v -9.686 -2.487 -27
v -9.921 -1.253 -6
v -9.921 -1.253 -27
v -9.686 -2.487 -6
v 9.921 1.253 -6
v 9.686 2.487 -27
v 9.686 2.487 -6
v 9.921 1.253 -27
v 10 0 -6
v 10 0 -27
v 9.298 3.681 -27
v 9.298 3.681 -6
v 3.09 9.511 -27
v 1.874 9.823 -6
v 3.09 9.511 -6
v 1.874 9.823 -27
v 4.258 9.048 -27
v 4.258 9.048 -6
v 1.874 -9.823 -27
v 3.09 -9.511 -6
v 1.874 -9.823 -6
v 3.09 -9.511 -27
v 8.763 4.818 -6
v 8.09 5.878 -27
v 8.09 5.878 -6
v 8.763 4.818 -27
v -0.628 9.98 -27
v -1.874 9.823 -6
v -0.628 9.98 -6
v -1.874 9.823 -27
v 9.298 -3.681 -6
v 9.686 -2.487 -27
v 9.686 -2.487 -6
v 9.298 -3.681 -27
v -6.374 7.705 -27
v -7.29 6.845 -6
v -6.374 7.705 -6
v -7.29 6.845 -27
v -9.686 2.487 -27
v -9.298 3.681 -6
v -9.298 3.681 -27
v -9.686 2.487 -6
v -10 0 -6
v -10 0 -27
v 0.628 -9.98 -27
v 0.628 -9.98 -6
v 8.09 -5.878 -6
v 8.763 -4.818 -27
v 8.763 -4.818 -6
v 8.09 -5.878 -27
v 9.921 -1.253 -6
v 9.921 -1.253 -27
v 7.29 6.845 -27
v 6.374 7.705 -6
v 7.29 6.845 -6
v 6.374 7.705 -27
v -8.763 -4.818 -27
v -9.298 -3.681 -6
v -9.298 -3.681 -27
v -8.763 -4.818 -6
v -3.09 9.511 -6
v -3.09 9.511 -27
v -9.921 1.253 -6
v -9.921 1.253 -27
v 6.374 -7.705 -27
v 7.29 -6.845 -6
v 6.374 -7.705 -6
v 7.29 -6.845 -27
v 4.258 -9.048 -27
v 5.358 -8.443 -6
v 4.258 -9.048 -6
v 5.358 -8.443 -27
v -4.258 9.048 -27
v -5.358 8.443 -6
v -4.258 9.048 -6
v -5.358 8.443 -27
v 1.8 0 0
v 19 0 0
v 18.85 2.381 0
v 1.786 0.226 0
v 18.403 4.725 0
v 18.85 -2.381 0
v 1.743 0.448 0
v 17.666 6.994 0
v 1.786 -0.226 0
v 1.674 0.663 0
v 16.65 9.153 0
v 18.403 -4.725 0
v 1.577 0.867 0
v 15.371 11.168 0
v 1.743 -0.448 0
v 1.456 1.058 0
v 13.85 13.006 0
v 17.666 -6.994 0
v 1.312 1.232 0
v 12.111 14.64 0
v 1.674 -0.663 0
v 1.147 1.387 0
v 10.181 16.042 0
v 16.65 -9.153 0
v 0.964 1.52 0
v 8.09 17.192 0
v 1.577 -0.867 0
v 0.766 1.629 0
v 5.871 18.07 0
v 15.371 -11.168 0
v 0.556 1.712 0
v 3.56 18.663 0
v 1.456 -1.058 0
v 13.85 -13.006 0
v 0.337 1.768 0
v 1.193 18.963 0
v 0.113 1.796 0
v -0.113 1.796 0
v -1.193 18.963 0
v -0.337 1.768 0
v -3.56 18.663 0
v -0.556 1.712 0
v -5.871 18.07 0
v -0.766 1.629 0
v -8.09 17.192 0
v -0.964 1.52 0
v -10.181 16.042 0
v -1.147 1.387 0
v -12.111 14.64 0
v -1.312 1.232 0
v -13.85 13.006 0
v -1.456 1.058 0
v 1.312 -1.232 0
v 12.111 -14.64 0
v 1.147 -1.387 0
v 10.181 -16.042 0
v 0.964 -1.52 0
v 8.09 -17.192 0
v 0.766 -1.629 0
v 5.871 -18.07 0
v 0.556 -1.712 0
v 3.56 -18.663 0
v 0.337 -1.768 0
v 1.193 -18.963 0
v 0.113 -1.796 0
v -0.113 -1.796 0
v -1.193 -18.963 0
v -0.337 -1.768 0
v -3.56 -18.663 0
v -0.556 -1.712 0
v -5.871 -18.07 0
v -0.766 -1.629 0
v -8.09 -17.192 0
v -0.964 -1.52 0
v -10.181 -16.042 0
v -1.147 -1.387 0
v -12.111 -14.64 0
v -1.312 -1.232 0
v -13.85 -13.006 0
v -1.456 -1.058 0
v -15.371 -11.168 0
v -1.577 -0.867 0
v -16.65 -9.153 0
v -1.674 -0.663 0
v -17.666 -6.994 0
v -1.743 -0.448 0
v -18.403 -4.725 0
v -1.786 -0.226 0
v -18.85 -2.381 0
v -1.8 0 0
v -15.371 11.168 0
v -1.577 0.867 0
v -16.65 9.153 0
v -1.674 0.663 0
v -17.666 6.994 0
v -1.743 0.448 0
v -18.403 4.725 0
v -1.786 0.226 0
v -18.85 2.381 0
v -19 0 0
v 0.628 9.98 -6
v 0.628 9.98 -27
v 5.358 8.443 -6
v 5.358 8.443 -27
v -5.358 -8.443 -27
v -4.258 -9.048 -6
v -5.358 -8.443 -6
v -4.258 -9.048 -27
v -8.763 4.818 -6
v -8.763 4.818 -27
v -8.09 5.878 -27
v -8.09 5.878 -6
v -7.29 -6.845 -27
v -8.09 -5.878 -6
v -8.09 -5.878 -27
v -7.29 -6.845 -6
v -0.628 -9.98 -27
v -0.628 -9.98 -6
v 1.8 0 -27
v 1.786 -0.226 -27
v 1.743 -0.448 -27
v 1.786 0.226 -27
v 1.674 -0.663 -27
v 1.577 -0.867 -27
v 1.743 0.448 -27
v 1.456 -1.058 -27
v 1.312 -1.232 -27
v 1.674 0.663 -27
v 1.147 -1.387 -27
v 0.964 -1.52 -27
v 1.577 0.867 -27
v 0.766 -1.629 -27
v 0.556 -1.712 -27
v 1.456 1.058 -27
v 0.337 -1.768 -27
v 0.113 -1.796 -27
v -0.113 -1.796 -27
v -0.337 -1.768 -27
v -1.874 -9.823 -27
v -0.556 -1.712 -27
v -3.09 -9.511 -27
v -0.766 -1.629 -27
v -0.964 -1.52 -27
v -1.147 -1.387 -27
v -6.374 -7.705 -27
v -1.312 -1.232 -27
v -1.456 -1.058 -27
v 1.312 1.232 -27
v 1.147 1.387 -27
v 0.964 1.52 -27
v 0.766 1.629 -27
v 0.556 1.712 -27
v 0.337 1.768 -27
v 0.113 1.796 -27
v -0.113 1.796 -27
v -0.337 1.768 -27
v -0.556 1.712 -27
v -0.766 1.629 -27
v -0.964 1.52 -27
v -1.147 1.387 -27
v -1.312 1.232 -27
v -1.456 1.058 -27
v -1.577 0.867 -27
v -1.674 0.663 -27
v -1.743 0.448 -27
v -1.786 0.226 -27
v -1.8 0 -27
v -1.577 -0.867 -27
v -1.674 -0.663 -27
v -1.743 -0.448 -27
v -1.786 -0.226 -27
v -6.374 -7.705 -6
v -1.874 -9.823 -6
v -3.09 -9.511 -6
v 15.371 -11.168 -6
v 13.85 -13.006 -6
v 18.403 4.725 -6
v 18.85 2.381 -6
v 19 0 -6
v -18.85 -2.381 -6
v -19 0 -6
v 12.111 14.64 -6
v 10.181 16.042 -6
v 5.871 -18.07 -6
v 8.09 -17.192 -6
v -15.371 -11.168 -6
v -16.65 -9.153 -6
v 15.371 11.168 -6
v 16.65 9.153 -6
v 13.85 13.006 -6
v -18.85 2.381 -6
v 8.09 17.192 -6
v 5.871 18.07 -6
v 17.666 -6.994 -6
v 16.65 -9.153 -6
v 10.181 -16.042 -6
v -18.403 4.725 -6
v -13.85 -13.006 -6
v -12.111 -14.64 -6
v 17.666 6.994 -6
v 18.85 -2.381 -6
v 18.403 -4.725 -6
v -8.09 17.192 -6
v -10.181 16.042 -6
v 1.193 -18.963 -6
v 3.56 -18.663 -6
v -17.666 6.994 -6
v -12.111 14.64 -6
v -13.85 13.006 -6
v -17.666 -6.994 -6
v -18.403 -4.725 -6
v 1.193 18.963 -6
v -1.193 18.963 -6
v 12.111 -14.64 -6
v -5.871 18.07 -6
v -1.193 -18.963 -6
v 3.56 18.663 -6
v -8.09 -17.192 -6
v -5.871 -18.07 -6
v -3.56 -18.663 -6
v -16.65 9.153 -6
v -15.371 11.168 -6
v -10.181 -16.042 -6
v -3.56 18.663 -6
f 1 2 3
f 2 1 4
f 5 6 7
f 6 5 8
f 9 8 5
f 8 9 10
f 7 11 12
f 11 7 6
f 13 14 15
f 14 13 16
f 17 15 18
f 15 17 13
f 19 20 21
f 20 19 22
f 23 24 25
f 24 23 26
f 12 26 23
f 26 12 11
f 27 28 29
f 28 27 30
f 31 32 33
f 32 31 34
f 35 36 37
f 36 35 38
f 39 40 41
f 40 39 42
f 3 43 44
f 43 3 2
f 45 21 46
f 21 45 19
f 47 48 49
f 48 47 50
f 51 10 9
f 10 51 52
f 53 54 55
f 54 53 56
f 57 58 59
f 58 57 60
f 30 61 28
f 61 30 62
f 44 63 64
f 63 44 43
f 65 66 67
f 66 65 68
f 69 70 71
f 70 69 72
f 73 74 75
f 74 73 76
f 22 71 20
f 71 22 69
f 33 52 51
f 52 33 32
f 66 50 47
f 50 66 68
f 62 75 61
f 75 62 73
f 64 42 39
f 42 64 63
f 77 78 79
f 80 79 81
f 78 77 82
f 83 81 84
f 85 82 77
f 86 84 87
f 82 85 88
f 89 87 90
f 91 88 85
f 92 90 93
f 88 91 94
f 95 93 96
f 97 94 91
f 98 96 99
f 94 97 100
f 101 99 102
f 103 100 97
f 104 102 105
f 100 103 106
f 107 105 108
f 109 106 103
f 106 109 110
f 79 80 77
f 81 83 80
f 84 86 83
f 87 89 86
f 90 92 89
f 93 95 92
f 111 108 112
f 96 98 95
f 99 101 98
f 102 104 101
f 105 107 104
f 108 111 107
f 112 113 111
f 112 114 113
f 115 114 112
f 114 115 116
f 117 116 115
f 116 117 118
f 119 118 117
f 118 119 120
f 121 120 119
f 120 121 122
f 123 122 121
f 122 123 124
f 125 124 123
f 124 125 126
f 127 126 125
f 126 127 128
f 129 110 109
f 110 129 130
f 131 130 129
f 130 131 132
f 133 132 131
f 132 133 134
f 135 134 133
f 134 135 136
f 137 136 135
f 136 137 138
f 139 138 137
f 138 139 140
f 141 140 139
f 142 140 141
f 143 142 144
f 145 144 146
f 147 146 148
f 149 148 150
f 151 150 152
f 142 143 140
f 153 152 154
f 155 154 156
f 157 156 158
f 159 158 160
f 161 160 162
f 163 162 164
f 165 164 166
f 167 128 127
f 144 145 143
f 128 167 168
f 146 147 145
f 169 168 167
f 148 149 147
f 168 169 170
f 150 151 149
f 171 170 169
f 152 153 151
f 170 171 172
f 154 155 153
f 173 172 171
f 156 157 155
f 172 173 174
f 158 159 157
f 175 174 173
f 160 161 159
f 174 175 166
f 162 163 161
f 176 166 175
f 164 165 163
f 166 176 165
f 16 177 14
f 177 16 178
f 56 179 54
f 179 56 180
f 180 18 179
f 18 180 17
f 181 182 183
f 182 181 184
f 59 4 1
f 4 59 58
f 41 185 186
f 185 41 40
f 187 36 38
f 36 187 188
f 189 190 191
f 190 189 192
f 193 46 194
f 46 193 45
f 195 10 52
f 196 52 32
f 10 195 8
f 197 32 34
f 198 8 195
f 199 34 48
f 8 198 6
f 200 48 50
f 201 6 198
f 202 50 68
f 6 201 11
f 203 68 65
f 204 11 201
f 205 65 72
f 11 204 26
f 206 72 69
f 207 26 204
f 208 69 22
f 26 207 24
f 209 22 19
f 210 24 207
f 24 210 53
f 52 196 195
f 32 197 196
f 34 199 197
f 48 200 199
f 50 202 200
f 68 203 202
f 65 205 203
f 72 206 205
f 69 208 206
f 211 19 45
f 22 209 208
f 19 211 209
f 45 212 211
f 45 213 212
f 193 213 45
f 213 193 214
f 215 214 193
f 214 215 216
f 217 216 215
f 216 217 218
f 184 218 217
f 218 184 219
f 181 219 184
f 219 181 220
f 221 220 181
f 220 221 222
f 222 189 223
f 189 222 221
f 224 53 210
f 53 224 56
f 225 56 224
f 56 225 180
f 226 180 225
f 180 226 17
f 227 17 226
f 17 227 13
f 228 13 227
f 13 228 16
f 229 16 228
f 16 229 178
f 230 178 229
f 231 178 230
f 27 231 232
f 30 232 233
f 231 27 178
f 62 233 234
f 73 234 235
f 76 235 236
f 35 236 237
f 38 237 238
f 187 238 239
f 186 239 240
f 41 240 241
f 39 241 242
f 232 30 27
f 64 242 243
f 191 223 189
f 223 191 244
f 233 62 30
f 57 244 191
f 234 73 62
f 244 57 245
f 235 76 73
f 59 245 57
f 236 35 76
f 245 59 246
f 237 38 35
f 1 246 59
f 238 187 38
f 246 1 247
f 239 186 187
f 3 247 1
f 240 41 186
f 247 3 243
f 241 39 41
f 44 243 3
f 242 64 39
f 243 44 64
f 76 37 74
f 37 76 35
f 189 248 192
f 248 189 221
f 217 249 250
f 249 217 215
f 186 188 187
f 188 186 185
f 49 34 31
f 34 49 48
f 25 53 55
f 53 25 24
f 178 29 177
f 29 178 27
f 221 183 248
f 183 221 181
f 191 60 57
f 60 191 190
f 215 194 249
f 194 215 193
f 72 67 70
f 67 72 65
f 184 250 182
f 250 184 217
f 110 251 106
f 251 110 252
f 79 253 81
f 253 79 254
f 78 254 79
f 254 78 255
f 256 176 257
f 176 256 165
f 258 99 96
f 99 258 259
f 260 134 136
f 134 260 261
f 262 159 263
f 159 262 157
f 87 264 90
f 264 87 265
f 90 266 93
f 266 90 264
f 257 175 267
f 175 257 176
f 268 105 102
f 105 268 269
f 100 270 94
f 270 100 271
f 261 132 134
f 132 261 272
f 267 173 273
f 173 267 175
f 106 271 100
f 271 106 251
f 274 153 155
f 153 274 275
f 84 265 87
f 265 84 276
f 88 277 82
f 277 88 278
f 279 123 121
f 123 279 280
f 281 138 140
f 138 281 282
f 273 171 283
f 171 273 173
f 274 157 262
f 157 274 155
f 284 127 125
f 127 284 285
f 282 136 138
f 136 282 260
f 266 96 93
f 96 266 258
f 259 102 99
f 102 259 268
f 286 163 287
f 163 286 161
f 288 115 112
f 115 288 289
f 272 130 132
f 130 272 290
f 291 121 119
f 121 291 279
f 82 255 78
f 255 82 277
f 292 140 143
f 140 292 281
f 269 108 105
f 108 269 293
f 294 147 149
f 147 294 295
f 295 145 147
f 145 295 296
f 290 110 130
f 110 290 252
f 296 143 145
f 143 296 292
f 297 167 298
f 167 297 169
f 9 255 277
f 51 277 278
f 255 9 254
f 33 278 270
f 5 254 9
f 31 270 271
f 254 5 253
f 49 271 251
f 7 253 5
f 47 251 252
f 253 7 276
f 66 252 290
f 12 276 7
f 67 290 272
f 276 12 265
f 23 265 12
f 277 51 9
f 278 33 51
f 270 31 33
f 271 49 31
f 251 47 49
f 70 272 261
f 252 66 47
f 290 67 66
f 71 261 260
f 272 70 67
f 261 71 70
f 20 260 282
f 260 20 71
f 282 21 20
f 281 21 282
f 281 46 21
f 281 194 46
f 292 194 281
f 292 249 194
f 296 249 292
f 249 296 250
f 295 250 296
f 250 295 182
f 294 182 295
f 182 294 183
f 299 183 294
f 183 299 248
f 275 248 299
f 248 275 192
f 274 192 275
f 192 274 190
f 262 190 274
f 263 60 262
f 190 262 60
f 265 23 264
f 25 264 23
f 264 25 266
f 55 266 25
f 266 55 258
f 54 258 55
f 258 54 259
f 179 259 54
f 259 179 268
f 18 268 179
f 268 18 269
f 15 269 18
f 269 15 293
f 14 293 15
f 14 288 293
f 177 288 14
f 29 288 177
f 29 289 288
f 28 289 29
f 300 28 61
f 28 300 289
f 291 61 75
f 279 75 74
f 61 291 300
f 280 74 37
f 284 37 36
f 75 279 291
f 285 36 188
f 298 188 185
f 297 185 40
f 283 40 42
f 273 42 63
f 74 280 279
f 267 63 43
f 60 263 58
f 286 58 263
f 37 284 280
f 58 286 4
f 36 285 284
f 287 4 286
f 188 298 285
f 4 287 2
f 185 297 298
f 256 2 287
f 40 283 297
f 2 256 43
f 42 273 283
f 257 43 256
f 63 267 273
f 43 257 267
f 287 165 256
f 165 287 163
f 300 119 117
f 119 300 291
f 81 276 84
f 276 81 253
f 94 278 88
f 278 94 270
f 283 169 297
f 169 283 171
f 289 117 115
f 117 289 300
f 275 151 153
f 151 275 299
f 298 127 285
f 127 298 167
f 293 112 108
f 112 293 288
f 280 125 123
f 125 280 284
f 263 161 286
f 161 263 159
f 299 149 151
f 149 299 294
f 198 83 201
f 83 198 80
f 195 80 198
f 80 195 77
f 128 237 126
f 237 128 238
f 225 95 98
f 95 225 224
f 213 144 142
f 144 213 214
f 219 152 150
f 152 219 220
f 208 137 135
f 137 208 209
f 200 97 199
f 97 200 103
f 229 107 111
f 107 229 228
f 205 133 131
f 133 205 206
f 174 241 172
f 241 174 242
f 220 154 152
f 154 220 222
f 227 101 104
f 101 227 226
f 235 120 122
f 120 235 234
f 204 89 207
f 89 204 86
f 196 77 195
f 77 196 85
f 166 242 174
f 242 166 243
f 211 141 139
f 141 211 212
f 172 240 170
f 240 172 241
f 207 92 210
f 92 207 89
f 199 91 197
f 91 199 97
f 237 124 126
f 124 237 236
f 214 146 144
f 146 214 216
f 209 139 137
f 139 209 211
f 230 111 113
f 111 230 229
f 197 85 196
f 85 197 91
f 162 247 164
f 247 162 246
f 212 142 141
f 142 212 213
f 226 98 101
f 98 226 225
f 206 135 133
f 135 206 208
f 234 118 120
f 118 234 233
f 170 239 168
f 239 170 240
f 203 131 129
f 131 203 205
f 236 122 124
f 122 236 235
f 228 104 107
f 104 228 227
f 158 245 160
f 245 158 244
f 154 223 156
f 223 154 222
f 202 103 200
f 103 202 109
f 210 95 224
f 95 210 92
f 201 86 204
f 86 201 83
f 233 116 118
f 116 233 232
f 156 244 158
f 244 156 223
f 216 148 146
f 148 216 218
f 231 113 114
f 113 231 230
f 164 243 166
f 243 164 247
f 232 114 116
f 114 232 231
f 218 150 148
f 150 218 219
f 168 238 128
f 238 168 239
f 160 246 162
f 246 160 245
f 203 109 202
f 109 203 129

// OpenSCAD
$fn = 50;


difference() {
	union() {
		translate(v = [0, 0, -27.0000000000]) {
			cylinder(h = 27, r = 10.0000000000);
		}
		translate(v = [0, 0, -6.0000000000]) {
			cylinder(h = 6, r = 19.0000000000);
		}
	}
	union() {
		#translate(v = [0, 0, -27]) {
			cylinder(h = 27, r = 1.8000000000);
		}
	}
}
